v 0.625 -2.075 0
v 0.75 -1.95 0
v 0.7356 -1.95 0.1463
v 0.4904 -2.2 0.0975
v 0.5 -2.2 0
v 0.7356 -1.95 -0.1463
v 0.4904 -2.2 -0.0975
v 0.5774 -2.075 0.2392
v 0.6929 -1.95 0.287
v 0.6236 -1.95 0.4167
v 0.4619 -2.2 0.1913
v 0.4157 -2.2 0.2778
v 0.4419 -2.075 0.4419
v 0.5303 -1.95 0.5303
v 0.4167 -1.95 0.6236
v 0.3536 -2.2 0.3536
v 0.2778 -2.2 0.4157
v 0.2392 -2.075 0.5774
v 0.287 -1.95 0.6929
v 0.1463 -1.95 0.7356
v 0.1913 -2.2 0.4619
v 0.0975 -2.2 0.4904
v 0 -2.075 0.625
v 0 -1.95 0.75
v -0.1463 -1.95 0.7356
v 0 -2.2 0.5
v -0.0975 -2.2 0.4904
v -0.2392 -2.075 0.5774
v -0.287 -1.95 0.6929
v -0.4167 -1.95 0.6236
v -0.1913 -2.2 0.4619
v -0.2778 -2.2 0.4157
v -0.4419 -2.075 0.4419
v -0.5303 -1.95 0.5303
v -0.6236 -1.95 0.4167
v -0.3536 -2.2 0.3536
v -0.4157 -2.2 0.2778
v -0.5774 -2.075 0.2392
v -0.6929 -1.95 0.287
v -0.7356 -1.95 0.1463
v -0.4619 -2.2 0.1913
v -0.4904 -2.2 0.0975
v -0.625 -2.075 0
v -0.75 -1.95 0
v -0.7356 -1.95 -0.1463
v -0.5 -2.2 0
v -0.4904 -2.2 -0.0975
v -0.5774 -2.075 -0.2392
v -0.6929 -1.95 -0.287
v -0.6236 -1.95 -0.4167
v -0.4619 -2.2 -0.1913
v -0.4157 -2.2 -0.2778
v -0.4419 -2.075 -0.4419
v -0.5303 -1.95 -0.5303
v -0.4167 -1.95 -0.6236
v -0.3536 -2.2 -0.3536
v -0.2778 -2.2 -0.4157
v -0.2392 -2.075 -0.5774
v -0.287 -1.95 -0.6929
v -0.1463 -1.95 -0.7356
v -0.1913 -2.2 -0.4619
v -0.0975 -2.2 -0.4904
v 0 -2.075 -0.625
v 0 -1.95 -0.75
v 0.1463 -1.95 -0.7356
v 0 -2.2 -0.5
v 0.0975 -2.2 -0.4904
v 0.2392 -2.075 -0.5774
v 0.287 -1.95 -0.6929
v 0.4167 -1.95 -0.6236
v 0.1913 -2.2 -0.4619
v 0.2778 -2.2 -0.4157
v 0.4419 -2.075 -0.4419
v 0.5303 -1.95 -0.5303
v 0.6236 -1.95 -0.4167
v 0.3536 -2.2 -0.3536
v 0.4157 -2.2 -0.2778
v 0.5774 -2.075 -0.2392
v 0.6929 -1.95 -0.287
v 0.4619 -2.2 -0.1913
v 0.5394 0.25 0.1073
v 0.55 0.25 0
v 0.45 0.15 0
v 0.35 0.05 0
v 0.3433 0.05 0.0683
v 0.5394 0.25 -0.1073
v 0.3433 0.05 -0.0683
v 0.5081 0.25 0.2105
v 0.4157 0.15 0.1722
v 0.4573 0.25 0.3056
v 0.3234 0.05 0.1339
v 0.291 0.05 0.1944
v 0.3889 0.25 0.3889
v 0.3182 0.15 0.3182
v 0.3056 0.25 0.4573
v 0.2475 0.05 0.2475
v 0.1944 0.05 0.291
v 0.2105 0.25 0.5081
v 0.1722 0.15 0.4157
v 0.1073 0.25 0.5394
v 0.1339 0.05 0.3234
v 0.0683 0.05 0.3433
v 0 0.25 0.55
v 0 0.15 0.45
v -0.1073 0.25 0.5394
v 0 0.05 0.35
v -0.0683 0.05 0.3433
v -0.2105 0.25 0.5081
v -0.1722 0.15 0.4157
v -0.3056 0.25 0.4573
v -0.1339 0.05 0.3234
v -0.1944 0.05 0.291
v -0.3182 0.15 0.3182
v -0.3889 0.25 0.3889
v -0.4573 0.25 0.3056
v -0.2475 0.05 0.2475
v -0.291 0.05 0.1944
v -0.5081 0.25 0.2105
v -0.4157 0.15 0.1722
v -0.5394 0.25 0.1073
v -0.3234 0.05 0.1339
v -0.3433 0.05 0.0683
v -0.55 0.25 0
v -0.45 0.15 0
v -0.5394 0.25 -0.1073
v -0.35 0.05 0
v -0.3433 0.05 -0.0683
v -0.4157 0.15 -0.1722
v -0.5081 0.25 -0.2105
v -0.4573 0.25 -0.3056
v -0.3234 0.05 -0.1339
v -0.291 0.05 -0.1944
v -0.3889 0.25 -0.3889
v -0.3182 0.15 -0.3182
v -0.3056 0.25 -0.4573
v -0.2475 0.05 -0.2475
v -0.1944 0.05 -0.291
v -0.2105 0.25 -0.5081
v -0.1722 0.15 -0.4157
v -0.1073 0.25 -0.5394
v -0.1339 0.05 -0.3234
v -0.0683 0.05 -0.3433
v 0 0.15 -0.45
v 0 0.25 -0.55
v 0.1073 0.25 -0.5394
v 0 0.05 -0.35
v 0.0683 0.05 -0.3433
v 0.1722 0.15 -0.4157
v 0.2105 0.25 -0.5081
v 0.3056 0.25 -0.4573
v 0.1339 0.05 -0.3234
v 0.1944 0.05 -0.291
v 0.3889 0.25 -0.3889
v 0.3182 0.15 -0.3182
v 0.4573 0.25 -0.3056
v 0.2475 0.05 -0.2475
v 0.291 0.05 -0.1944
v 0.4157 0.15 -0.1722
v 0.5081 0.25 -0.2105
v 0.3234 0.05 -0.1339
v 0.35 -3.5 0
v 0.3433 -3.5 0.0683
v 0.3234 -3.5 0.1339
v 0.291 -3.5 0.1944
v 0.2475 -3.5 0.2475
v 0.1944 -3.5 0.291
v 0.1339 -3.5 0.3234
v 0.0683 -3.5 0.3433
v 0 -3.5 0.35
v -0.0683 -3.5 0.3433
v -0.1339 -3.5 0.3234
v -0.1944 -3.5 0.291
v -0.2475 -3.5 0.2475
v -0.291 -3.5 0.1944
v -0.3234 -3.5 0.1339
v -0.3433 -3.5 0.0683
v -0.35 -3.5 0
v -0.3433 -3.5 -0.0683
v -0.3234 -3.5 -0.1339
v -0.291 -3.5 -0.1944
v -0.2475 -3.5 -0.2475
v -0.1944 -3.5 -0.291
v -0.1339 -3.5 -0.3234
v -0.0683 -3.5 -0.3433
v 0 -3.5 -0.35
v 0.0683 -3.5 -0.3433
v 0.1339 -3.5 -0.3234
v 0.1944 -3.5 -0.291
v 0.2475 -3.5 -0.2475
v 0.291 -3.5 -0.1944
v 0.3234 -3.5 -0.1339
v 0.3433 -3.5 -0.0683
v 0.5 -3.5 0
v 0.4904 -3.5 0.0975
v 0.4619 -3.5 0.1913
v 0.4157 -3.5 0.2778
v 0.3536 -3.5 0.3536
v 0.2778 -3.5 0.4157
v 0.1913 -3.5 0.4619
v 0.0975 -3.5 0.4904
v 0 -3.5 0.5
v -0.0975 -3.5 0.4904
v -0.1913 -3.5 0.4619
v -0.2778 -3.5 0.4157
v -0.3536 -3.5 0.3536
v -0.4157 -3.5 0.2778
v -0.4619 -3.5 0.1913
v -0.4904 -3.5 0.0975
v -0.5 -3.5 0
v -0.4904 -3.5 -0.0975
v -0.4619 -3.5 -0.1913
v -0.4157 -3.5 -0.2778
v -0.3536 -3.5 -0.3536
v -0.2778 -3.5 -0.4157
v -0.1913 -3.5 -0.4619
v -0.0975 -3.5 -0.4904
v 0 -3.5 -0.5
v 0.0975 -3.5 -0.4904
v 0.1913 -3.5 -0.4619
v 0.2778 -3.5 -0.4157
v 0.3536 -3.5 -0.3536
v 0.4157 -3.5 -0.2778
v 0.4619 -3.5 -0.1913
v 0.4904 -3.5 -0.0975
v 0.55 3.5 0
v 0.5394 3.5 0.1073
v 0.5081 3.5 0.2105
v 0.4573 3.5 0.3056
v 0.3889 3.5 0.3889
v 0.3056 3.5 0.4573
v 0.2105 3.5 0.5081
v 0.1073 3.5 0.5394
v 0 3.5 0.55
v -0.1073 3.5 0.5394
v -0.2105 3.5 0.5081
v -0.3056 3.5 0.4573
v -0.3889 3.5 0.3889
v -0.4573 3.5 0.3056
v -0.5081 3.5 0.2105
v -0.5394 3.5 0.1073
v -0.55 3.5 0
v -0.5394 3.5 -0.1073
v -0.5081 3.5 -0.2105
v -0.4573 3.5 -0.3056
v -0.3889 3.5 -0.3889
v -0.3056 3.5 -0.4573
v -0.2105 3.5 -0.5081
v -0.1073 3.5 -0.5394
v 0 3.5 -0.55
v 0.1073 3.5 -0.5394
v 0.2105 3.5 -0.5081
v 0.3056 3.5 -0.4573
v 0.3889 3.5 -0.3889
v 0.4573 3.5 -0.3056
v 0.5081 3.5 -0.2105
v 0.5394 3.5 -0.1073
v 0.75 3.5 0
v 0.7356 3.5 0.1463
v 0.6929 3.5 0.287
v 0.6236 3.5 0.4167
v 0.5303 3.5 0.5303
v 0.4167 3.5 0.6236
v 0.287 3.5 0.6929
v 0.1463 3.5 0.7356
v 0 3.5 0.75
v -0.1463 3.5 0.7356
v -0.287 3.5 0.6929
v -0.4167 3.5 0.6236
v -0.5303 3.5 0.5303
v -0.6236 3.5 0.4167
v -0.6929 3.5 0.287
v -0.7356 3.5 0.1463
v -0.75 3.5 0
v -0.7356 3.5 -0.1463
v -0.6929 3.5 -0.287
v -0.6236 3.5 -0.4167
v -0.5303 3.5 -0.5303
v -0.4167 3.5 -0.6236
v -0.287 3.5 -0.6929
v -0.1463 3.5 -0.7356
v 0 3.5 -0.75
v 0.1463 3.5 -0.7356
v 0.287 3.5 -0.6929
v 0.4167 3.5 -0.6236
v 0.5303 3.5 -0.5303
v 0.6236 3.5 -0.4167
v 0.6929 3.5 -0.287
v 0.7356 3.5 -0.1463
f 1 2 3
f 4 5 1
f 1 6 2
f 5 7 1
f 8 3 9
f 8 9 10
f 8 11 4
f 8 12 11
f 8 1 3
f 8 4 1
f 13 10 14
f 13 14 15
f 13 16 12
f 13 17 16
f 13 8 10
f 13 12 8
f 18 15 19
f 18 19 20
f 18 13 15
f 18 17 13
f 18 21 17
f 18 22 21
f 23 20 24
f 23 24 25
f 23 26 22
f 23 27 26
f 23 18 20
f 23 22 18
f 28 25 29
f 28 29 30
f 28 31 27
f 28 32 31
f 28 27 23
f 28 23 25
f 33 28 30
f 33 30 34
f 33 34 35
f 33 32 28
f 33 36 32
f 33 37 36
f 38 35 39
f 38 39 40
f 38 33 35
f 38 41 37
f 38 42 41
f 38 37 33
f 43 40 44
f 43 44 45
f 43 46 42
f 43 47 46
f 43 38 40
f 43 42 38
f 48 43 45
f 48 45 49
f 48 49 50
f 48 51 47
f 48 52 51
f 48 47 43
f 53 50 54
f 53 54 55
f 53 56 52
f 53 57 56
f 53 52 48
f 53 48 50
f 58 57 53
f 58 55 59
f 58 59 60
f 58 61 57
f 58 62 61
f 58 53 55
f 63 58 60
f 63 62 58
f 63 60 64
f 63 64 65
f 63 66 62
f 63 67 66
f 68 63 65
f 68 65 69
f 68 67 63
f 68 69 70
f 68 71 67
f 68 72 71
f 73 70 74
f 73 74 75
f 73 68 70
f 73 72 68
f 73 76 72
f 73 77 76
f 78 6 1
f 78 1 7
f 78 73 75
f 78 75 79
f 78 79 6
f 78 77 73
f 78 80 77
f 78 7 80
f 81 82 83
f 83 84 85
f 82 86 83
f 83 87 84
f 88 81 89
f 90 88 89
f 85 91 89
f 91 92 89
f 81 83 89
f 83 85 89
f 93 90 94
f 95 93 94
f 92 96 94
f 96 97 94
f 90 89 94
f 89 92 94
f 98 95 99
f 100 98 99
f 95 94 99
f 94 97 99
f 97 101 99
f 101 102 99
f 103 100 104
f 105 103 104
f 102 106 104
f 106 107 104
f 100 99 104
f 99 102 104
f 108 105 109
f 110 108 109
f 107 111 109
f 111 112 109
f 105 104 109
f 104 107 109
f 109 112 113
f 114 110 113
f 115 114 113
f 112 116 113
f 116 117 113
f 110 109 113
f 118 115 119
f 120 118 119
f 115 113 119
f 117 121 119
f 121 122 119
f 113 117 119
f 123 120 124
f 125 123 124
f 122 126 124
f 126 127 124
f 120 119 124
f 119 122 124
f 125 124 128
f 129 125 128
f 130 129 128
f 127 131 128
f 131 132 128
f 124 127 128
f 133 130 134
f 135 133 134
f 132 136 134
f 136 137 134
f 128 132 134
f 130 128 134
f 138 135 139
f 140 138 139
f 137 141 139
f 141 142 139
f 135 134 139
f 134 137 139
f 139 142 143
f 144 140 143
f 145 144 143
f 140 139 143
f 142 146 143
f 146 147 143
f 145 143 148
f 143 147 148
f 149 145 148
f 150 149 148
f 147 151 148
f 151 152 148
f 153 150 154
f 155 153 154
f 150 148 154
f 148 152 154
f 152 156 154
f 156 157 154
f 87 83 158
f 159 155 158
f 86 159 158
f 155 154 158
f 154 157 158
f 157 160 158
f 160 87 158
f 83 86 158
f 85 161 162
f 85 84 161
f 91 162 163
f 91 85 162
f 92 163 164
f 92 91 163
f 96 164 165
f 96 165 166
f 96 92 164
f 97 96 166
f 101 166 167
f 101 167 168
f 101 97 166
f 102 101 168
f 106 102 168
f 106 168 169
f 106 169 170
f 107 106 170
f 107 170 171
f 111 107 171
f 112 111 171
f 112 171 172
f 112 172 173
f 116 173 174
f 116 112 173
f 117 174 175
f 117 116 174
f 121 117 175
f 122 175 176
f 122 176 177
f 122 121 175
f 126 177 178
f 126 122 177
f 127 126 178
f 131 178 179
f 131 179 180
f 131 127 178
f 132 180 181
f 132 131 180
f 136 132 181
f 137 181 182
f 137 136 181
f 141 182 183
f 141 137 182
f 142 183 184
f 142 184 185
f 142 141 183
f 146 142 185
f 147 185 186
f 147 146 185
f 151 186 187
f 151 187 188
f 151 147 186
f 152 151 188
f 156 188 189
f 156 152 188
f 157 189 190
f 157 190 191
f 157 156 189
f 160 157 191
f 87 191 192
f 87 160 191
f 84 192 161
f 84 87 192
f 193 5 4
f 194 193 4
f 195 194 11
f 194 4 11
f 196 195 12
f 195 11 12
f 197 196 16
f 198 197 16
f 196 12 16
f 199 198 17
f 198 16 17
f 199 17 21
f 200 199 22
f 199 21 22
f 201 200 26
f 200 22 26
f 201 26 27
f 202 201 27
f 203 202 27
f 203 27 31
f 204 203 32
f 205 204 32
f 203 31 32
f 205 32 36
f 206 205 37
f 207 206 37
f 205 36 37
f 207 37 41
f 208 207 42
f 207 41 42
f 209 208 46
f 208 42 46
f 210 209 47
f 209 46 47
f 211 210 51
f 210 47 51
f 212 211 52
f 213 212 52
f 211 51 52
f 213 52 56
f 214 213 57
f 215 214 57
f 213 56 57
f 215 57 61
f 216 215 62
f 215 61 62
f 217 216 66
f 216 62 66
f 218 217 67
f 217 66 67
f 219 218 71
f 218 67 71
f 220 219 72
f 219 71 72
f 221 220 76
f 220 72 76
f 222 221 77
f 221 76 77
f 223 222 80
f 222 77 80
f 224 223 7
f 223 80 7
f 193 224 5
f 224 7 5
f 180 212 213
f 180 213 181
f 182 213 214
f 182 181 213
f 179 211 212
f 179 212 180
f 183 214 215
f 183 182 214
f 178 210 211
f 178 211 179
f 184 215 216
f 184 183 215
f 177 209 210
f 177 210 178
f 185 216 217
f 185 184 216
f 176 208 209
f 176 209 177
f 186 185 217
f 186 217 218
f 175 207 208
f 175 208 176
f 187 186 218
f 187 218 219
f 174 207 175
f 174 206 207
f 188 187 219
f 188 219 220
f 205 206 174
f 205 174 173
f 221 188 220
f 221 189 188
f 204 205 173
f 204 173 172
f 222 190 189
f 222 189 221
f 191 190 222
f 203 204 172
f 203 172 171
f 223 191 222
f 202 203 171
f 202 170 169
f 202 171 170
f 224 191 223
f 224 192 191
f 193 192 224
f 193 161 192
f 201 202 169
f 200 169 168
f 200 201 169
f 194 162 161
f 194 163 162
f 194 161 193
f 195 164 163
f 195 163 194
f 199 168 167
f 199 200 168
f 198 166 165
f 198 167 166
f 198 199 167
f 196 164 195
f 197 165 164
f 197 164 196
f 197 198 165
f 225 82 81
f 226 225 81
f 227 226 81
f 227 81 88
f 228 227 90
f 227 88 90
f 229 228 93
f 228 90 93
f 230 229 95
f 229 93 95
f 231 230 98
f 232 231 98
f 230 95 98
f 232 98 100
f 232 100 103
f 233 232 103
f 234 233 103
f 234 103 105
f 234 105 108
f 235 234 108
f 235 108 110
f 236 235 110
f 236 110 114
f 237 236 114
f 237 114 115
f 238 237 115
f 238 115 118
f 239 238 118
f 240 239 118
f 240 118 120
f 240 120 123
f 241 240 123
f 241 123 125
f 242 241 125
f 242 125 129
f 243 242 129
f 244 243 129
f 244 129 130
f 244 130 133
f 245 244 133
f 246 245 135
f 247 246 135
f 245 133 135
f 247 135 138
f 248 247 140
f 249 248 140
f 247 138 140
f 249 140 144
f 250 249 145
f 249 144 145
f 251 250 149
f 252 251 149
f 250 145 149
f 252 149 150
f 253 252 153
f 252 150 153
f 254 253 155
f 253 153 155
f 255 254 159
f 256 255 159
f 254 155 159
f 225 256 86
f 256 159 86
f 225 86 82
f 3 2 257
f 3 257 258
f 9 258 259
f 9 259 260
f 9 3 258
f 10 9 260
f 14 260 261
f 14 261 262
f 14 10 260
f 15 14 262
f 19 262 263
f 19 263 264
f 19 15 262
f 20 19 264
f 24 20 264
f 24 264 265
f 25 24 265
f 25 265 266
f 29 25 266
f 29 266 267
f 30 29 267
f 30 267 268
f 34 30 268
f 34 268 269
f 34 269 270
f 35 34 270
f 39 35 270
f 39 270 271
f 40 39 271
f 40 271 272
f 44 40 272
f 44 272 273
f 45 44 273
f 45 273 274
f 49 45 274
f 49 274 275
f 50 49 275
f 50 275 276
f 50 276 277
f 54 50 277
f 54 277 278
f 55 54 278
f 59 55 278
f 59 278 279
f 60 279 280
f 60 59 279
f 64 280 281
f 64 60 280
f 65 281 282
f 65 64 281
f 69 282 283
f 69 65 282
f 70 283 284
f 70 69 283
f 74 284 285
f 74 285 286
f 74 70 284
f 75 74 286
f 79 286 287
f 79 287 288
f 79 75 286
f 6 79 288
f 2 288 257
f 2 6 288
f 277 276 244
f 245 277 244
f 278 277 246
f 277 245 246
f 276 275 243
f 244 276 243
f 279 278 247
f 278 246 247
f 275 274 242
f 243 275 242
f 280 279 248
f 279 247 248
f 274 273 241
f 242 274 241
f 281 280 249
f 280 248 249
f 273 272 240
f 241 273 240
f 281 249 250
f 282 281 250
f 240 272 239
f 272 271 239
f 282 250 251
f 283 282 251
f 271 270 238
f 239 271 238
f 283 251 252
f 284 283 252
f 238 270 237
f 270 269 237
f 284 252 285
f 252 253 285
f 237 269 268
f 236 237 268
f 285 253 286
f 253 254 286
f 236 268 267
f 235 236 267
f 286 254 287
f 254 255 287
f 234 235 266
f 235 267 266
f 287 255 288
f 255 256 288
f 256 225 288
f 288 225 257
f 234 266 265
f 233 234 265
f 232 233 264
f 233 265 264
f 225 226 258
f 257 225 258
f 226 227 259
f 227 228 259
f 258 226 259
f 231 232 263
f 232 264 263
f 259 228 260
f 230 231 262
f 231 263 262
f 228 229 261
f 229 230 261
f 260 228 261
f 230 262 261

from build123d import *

# Parameters (mm, degrees)
F0_R        = 0.75
F1_DEPTH    = 2.2
F2_DEPTH    = 3.5
F3_R        = 0.55
F4_DEPTH    = 5
F5_R        = 0.35
F6_DEPTH    = 5
F7_S5_R     = 0.35
F7_T6_DEPTH = 2
F8_R        = 0.5
F8_R_2      = 0.35
F9_DEPTH    = 1.3
F10_SIZE    = 0.24999


# Not quite as in the source:
# - a fillet or chamfer that OpenCascade refuses, or shapes differently, is made with other operations: its cross-section is extruded or revolved along the edge and cut away or added
# - a fillet or chamfer is up to 0.001 mm smaller than in the source, because OpenCascade refuses the exact size


with BuildPart() as f1:
    # F0 (on Front) → F1 (new body)
    with BuildSketch(Plane.XZ):
        Circle(F0_R)
    extrude(amount=F1_DEPTH)

    # F2 (add): a face of the model
    f2_faces = [f1.faces().sort_by_distance(p)[0] for p in [
        (0, 0, 0),
    ]]
    extrude(f2_faces, amount=F2_DEPTH)

    # F3 (on Front) → F4 (cut)
    with BuildSketch(Plane.XZ):
        Circle(F3_R)
    extrude(amount=-F4_DEPTH, mode=Mode.SUBTRACT)

    # F5 (on Front) → F6 (cut)
    with BuildSketch(Plane.XZ):
        Circle(F5_R)
    extrude(amount=F6_DEPTH, mode=Mode.SUBTRACT)

    # F7: chamfer of 0.25 on 1 edges, made by hand


with BuildPart() as f7_tool2:
    # F7_s3 → F7_t4 (revolve)
    with BuildSketch(Plane.XY):
        Polygon((0.55, 0.25), (0.3, 0), (0.55, 0), align=None)
    revolve(axis=Axis((0, 0, 0), (0, -1, 0)))

    # F7_s5 → F7_t6 (cut, symmetric)
    with BuildSketch(Plane.XZ.offset(-0.1)):
        Circle(F7_S5_R)
    extrude(amount=F7_T6_DEPTH, both=True, mode=Mode.SUBTRACT)


with BuildPart() as f1_1:
    add(f1.part)

    # F7_t1: union F7_tool2
    add(f7_tool2.part)

    # F8 (on face) → F9 (join)
    with BuildSketch(Plane.XZ.offset(2.2)):
        Circle(F8_R)
        Circle(F8_R_2, mode=Mode.SUBTRACT)
    extrude(amount=F9_DEPTH)

    # F10 (size 0.25 in the source; OpenCascade refuses exactly that, so slightly less here)
    f10_edges = [f1_1.edges().sort_by_distance(p)[0] for p in [
        (-0.75, -2.2, 0),
    ]]
    chamfer(f10_edges, length=F10_SIZE)


solid = f1_1.part
